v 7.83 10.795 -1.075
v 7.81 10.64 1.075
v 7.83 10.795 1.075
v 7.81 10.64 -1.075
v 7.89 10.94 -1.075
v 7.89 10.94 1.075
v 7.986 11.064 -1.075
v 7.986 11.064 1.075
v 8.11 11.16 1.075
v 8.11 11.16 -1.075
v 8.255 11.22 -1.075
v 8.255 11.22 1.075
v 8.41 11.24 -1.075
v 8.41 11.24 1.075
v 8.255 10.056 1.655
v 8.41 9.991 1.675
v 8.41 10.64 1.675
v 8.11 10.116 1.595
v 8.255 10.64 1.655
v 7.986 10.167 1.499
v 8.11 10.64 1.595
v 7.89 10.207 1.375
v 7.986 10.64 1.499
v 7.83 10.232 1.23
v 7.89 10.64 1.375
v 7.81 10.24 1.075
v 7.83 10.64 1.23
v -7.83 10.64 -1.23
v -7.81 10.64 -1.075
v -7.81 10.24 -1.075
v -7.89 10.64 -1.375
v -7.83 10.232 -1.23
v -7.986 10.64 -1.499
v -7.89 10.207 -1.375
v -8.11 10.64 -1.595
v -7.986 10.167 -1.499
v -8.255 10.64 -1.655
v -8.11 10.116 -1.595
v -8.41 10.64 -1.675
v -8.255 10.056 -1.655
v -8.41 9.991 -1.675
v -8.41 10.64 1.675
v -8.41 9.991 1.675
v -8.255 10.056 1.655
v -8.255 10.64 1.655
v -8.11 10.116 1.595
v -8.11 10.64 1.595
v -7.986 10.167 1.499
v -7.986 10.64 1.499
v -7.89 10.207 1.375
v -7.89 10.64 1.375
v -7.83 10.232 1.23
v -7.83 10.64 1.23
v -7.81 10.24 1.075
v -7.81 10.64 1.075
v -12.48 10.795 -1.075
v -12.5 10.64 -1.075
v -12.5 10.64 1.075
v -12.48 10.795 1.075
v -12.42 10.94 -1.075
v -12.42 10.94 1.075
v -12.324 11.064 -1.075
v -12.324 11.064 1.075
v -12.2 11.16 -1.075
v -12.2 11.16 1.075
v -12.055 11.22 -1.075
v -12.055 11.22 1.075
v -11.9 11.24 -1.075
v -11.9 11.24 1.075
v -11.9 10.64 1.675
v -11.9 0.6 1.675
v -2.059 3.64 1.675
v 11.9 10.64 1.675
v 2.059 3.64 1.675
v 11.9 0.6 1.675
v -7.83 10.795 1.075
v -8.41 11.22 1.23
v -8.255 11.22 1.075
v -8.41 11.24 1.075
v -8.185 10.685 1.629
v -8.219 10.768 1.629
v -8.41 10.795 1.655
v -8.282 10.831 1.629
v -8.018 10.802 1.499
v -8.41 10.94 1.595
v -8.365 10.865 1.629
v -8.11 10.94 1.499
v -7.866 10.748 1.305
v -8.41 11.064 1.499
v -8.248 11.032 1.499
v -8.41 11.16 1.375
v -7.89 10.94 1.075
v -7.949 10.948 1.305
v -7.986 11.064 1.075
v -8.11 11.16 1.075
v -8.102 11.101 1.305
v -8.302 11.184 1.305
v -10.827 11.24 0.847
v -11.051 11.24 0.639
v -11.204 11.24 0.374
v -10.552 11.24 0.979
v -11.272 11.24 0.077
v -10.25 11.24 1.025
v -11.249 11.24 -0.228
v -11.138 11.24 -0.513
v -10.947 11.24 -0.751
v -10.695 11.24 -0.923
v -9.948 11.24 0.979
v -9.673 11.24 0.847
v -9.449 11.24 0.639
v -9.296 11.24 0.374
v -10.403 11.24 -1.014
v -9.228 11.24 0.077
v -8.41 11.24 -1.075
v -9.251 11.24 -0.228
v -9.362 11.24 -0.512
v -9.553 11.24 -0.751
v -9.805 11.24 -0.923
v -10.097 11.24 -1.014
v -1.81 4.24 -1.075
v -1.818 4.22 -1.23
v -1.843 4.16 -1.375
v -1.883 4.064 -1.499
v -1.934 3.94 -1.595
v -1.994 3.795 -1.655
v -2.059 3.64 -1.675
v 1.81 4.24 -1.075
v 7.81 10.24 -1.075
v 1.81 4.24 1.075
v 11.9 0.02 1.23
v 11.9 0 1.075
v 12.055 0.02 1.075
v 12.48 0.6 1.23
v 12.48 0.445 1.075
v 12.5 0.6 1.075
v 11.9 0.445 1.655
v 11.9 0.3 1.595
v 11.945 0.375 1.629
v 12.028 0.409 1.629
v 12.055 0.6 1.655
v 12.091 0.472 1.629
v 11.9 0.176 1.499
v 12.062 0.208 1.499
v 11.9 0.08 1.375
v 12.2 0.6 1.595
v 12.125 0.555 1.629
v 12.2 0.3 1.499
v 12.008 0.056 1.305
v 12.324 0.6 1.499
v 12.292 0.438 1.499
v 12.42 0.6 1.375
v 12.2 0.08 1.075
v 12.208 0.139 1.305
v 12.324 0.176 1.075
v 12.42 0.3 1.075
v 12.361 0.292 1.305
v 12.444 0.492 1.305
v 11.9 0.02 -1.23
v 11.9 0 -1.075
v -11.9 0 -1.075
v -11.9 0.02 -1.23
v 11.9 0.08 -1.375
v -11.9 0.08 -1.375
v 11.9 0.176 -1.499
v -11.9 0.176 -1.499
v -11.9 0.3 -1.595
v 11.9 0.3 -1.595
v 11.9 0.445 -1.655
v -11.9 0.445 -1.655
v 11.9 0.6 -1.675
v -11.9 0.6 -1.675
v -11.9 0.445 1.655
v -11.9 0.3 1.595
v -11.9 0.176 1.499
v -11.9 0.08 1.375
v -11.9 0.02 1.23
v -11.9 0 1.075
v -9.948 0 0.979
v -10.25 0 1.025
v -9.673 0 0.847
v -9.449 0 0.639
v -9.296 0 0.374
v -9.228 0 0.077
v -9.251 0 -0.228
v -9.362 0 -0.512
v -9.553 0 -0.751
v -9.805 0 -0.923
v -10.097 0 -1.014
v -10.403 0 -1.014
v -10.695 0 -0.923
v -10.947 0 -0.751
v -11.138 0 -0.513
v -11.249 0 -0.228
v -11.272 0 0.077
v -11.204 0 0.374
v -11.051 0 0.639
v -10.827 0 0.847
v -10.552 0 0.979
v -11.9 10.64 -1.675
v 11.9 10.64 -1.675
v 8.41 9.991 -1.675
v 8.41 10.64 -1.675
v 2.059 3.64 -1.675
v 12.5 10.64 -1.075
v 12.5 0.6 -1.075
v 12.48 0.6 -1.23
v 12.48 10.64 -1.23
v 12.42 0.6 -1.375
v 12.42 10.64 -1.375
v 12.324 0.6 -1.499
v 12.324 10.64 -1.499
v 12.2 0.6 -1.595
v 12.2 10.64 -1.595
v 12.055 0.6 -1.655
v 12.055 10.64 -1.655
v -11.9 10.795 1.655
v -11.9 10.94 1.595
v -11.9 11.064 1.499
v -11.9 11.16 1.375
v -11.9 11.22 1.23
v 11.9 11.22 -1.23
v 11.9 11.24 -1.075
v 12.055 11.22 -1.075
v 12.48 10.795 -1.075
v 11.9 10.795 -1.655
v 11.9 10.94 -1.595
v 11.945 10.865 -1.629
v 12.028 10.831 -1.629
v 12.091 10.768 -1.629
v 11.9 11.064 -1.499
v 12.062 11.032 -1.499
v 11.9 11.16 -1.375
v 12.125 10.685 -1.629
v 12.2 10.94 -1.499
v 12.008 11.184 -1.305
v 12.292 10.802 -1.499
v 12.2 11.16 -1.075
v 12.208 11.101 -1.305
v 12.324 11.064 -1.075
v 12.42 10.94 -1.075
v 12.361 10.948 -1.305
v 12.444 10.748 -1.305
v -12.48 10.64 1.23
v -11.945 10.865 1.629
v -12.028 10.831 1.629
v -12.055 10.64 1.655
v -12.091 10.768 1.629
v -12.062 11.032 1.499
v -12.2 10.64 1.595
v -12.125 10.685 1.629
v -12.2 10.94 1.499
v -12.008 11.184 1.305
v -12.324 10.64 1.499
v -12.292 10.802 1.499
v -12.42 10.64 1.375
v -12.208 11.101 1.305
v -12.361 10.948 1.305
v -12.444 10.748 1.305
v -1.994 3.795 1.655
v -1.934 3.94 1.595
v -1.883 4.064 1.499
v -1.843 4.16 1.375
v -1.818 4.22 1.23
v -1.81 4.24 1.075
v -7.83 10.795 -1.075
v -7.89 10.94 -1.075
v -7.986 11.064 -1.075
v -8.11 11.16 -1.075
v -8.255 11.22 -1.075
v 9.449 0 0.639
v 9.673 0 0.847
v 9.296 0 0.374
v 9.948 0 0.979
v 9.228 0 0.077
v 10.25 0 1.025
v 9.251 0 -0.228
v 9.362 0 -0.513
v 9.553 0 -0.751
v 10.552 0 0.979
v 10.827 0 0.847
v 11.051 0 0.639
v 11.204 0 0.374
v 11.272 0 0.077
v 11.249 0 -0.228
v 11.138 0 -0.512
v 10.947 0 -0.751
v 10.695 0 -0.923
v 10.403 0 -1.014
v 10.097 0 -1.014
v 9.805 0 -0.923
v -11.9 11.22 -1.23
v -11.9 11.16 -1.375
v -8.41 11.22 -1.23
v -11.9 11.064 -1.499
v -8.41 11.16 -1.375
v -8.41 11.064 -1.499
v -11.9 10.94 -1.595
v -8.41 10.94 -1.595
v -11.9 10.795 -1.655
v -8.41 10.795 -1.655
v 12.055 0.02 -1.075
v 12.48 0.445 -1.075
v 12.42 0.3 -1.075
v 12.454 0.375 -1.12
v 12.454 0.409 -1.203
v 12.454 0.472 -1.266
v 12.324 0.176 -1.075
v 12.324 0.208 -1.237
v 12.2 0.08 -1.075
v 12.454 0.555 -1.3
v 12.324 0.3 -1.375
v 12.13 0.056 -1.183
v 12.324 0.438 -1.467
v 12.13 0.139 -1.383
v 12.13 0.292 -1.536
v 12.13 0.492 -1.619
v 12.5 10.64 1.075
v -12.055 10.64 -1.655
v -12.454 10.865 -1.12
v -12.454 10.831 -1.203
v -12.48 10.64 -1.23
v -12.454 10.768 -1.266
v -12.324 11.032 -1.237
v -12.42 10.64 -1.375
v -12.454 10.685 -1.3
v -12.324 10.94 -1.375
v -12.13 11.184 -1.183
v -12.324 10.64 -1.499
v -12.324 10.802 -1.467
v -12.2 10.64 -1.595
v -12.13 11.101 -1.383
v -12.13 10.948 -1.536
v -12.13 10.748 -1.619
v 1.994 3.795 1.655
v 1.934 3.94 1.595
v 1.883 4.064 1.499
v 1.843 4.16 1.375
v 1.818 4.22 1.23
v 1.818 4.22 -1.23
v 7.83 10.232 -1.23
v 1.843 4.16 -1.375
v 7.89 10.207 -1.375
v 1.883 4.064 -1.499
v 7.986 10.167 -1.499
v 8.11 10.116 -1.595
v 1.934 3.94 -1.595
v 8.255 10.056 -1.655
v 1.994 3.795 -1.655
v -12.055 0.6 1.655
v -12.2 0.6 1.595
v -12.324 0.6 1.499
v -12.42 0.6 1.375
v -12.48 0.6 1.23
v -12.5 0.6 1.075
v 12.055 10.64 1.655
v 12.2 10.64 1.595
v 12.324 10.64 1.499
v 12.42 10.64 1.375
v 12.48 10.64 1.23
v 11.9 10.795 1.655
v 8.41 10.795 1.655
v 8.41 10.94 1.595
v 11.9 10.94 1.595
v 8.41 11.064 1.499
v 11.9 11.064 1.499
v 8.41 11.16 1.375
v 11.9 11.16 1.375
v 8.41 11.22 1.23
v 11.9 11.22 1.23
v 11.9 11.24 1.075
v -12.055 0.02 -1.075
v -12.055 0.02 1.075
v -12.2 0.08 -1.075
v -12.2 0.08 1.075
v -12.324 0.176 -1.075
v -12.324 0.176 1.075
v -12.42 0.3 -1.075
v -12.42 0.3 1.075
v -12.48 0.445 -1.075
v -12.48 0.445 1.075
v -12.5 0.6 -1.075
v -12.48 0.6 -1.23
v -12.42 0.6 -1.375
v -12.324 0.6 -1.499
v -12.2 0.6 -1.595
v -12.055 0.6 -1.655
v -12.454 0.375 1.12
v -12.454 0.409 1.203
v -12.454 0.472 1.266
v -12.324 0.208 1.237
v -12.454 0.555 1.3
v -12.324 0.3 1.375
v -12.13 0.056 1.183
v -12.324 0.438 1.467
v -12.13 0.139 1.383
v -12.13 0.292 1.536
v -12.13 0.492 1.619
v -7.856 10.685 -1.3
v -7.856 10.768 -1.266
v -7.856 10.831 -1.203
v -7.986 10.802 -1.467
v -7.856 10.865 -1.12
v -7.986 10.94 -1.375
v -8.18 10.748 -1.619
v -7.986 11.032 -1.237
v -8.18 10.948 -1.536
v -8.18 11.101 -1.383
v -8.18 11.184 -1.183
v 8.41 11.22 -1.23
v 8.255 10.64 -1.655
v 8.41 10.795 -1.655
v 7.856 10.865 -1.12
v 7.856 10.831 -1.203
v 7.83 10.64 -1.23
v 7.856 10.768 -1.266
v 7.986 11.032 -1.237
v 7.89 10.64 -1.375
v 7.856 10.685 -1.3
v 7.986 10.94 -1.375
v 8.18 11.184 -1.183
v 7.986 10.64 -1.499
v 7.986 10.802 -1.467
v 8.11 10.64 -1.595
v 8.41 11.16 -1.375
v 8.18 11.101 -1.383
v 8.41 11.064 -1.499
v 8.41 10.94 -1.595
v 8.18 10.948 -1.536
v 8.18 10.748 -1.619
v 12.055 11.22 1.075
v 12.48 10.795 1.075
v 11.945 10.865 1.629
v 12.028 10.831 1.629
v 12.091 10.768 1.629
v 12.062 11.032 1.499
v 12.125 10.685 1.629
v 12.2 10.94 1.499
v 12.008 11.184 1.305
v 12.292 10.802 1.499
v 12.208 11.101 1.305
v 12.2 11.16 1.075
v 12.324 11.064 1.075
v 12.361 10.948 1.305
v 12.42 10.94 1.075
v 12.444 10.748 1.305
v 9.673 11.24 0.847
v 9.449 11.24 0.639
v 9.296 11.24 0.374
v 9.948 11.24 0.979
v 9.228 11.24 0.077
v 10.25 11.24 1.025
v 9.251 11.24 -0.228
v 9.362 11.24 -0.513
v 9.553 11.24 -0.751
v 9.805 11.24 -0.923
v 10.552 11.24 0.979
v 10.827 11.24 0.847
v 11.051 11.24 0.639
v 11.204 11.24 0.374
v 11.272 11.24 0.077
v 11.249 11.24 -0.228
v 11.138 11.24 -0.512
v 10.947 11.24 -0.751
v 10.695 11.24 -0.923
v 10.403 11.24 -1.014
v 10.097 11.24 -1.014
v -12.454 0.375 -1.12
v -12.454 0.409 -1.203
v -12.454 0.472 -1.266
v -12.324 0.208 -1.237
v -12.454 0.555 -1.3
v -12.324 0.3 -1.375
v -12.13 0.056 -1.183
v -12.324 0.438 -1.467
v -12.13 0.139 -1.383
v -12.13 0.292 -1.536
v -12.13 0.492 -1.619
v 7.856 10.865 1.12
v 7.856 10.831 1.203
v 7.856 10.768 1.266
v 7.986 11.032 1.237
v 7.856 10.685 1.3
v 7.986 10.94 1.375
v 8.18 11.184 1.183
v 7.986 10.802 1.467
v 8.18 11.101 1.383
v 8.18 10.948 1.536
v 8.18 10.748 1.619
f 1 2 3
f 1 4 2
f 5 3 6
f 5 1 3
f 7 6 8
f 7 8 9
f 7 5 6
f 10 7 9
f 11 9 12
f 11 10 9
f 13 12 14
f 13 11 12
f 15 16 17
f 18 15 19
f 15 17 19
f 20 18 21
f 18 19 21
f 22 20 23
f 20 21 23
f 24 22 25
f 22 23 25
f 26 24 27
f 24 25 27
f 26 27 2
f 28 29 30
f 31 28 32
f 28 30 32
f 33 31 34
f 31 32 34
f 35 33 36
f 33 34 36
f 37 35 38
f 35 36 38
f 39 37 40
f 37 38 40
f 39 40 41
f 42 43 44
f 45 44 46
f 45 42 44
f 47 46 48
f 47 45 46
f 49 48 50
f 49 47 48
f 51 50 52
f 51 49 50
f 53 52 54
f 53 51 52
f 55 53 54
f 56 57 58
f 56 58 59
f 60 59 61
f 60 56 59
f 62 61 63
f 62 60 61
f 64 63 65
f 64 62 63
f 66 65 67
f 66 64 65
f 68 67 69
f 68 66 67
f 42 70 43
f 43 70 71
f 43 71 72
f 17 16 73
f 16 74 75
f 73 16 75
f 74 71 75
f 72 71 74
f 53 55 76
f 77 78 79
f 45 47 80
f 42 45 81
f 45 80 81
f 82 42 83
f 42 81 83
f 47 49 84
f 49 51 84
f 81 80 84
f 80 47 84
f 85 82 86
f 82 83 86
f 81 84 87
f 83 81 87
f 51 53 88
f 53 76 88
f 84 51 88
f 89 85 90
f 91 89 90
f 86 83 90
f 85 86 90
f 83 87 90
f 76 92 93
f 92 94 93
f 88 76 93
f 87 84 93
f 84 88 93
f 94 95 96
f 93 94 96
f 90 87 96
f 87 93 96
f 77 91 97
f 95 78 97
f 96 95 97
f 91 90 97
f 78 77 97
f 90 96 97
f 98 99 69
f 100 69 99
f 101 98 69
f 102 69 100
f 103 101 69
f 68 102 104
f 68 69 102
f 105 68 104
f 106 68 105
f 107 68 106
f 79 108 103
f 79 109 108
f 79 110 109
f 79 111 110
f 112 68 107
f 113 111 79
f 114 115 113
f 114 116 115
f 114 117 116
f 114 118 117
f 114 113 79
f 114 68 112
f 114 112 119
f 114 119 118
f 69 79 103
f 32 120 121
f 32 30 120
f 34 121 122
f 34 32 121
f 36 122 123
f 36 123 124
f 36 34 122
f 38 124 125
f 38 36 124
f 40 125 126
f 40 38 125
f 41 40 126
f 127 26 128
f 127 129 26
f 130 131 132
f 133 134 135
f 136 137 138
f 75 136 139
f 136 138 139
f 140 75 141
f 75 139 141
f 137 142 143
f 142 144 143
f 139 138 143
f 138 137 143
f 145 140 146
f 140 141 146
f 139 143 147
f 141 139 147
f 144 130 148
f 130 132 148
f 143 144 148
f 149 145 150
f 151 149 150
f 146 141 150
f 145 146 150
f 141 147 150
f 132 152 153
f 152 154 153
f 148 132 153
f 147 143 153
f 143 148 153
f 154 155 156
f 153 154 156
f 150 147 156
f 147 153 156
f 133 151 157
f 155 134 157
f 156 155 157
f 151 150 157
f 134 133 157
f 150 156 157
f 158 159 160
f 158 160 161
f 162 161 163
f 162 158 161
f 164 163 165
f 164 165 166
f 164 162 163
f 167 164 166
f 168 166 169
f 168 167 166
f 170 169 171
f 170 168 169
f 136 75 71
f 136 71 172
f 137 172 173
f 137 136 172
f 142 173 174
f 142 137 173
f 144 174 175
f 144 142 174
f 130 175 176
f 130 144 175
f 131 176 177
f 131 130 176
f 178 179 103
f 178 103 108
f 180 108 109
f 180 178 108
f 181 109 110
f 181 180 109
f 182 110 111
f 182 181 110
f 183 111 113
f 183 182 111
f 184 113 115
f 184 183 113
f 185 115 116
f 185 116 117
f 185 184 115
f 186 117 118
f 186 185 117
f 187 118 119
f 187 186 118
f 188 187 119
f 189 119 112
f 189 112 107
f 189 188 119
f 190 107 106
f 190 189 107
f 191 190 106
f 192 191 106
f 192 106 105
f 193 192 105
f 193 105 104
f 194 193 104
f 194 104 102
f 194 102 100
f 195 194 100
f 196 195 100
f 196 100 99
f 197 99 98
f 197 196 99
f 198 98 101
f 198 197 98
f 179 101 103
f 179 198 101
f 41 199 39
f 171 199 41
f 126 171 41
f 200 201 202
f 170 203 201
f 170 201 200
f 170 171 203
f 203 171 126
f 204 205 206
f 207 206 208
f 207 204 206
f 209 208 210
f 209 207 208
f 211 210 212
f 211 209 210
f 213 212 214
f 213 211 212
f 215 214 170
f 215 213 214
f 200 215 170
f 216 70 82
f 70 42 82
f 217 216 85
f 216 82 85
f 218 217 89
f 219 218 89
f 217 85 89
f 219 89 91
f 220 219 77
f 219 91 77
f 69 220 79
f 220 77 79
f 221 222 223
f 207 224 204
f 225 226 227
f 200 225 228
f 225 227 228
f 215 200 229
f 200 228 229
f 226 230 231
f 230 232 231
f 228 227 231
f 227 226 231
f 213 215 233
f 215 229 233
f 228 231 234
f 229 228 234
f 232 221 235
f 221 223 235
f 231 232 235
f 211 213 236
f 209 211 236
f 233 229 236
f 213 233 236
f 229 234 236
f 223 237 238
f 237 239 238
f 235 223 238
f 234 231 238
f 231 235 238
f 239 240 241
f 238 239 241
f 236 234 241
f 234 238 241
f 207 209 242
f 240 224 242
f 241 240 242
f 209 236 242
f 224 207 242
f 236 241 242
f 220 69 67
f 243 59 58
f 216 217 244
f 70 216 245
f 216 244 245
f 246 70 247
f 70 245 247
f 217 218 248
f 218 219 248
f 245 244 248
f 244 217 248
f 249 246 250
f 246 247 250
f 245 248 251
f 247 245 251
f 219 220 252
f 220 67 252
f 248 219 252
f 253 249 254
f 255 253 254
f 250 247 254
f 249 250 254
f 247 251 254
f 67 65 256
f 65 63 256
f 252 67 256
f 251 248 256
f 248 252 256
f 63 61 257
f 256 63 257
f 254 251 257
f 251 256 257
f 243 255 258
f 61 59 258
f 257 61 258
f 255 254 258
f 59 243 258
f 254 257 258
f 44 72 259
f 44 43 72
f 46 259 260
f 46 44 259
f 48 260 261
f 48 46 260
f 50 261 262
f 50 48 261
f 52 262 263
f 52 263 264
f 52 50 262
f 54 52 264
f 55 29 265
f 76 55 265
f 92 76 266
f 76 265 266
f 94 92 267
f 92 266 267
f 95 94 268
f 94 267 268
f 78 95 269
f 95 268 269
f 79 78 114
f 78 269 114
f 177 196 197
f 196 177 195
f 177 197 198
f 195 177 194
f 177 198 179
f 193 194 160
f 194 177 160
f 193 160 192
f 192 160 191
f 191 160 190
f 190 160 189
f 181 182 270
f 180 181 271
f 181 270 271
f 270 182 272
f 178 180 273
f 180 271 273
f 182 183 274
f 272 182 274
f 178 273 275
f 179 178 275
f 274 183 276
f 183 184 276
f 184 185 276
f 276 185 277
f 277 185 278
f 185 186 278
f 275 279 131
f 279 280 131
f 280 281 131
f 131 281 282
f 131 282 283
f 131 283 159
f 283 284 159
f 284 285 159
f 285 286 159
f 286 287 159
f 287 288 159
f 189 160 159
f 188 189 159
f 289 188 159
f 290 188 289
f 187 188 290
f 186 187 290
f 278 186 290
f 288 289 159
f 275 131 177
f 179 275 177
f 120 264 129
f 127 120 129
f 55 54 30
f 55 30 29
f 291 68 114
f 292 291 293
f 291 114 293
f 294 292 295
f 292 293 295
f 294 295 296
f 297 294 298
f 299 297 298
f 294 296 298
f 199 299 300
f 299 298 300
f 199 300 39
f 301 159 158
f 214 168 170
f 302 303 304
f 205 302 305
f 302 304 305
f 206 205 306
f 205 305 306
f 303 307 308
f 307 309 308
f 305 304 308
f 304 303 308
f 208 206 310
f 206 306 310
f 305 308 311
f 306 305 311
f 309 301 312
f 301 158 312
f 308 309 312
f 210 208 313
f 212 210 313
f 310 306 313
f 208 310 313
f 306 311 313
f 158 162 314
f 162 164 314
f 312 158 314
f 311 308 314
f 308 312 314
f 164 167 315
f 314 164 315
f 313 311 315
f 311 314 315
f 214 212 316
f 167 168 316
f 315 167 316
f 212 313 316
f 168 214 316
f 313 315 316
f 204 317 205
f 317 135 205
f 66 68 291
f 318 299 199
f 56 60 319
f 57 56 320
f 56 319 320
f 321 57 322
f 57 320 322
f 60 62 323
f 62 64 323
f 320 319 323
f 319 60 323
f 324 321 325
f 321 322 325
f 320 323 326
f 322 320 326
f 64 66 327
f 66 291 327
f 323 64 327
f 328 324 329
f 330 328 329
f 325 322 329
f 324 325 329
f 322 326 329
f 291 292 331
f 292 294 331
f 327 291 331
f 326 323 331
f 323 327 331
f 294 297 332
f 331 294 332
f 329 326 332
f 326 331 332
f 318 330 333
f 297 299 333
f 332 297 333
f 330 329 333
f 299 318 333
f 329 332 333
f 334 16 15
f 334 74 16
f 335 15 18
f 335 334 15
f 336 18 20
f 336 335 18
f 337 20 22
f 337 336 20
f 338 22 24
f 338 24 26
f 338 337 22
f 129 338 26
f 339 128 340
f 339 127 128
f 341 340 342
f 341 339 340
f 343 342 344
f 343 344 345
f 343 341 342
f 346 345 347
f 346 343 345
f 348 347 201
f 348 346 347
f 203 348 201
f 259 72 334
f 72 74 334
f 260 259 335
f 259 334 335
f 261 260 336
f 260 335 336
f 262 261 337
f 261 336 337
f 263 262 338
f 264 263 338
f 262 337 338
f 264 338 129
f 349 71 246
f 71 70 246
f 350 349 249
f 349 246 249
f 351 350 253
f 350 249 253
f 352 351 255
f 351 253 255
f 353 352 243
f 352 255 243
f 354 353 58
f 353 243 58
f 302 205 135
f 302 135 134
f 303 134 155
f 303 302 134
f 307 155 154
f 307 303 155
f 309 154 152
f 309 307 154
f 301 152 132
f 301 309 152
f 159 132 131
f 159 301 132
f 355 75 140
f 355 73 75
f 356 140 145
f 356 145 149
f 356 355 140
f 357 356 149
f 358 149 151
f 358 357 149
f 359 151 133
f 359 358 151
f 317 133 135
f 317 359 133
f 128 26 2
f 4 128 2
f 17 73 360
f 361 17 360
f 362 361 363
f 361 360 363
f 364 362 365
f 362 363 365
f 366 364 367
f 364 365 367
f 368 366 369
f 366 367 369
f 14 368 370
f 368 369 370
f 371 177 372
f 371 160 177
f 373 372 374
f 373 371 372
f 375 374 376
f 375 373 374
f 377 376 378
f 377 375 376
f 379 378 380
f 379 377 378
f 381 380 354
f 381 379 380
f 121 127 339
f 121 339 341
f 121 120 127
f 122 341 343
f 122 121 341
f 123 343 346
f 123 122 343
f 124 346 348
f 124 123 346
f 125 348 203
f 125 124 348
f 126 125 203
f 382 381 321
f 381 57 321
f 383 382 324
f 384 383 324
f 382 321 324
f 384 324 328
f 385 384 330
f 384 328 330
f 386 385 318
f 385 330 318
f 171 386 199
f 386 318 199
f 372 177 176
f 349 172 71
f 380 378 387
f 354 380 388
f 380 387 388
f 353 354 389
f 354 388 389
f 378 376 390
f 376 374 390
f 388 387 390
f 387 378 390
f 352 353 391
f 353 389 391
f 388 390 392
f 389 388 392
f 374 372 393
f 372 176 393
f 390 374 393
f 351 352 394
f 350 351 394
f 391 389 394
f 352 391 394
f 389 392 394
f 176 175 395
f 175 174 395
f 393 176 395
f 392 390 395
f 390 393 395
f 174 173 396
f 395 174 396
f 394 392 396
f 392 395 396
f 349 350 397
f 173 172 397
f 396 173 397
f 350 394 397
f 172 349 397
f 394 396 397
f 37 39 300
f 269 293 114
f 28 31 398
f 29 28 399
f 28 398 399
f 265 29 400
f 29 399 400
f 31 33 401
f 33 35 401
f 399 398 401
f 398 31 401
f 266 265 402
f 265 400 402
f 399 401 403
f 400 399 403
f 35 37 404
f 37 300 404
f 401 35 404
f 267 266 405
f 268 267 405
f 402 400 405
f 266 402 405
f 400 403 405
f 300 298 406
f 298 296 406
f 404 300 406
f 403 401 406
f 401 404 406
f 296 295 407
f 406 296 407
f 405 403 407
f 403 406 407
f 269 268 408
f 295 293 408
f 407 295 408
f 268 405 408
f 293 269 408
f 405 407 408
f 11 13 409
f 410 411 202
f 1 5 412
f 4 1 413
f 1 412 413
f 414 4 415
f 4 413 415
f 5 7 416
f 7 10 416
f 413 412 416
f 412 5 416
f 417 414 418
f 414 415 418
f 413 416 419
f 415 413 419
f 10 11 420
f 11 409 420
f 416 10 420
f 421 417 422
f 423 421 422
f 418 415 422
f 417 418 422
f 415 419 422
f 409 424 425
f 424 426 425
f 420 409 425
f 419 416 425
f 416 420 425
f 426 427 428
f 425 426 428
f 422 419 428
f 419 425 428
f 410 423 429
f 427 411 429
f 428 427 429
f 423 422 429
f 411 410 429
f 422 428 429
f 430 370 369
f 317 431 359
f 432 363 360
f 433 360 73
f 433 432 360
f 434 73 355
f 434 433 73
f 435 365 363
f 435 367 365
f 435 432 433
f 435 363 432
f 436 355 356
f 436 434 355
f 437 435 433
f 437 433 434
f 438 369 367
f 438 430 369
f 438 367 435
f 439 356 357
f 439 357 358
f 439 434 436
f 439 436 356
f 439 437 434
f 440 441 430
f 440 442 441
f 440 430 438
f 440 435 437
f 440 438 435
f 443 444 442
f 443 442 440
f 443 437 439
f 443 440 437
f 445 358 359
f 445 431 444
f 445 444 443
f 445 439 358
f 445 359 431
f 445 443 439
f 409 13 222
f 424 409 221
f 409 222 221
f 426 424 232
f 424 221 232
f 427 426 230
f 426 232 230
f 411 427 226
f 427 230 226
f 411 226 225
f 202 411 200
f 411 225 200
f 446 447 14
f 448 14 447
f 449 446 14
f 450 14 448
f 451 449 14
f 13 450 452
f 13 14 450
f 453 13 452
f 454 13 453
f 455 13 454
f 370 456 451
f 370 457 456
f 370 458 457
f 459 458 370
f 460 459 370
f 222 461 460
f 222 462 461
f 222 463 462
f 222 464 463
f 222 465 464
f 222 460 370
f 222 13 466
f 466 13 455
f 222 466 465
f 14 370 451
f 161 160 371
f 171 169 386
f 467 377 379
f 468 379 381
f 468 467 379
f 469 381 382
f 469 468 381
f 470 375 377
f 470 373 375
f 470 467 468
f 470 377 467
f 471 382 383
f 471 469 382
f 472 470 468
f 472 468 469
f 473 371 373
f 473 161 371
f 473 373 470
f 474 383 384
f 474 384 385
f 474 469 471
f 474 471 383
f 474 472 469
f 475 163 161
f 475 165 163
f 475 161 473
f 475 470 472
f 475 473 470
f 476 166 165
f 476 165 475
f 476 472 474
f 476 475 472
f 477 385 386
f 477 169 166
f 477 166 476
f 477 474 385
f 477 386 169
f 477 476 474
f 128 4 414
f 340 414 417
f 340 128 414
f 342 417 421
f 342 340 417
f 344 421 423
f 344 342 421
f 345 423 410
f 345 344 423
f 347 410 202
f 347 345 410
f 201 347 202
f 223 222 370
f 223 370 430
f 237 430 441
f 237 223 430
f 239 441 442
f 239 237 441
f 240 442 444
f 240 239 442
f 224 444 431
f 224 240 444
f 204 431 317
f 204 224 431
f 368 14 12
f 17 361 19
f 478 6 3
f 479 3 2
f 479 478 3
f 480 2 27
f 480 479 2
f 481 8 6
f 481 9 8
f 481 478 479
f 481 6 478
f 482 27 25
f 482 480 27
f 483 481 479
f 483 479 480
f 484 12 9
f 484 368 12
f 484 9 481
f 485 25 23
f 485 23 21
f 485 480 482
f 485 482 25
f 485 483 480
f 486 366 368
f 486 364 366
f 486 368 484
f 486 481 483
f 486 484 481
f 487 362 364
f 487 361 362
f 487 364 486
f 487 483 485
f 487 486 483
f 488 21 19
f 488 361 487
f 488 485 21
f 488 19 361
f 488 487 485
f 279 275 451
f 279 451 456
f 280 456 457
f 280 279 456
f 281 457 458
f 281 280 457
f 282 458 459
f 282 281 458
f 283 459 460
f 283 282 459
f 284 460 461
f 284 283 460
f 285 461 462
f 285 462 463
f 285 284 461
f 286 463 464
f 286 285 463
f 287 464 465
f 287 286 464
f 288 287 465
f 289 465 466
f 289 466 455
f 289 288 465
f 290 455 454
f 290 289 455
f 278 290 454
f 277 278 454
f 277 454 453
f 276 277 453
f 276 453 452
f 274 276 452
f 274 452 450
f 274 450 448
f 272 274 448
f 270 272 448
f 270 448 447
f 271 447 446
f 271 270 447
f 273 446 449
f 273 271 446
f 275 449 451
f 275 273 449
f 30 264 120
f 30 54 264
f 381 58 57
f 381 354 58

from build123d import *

# Parameters (mm, degrees)
SKETCH1_W              = 25
SKETCH1_H              = 3.35
SKETCH1_R              = 1.025
STANDOFF_EXTRUDE_DEPTH = 11.24
SKETCH2_W              = 15.62
SKETCH2_H              = 7
STANDOFF_CUT_DEPTH     = 18.140889709
CHAMFER1_SIZE          = 6
FILLET2_R              = 0.6


with BuildPart() as part:
    # Sketch1 → Standoff Extrude (new body)
    with BuildSketch(Plane(origin=(0, 0, 0), x_dir=(1, 0, 0), z_dir=(0, 1, 0))):
        Rectangle(SKETCH1_W, SKETCH1_H)
        with Locations(Location((-10.25, 0, 0), (0, 0, 270))):
            Circle(SKETCH1_R, mode=Mode.SUBTRACT)
        with Locations(Location((10.25, 0, 0), (0, 0, 270))):
            Circle(SKETCH1_R, mode=Mode.SUBTRACT)
    extrude(amount=STANDOFF_EXTRUDE_DEPTH)

    # Sketch2 → Standoff Cut (cut, through all)
    with BuildSketch(Plane.XY.offset(1.675)):
        with Locations((0, 7.74)):
            Rectangle(SKETCH2_W, SKETCH2_H)
    extrude(amount=-STANDOFF_CUT_DEPTH, mode=Mode.SUBTRACT)

    # Chamfer1
    chamfer1_edges = [part.edges().sort_by_distance(p)[0] for p in [
        (-7.81, 4.24, 0),
        (7.81, 4.24, 0),
    ]]
    chamfer(chamfer1_edges, length=CHAMFER1_SIZE)

    # Fillet2
    fillet2_edges = [part.edges().sort_by_distance(p)[0] for p in [
        (12.5, 11.24, 0),
        (10.155, 11.24, -1.675),
        (-10.155, 11.24, -1.675),
        (10.155, 11.24, 1.675),
        (-7.81, 10.74, -1.675),
        (-7.81, 11.24, 0),
        (7.81, 11.24, 0),
        (-7.81, 10.74, 1.675),
        (7.81, 10.74, 1.675),
        (7.81, 10.74, -1.675),
        (0, 4.24, 1.675),
        (0, 4.24, -1.675),
        (-12.5, 11.24, 0),
        (4.81, 7.24, 1.675),
        (4.81, 7.24, -1.675),
        (-4.81, 7.24, 1.675),
        (-4.81, 7.24, -1.675),
        (0, 0, -1.675),
        (12.5, 0, 0),
        (0, 0, 1.675),
        (-12.5, 0, 0),
        (-10.155, 11.24, 1.675),
        (-12.5, 5.62, -1.675),
        (12.5, 5.62, -1.675),
        (12.5, 5.62, 1.675),
        (-12.5, 5.62, 1.675),
    ]]
    fillet(fillet2_edges, radius=FILLET2_R)


solid = part.part
